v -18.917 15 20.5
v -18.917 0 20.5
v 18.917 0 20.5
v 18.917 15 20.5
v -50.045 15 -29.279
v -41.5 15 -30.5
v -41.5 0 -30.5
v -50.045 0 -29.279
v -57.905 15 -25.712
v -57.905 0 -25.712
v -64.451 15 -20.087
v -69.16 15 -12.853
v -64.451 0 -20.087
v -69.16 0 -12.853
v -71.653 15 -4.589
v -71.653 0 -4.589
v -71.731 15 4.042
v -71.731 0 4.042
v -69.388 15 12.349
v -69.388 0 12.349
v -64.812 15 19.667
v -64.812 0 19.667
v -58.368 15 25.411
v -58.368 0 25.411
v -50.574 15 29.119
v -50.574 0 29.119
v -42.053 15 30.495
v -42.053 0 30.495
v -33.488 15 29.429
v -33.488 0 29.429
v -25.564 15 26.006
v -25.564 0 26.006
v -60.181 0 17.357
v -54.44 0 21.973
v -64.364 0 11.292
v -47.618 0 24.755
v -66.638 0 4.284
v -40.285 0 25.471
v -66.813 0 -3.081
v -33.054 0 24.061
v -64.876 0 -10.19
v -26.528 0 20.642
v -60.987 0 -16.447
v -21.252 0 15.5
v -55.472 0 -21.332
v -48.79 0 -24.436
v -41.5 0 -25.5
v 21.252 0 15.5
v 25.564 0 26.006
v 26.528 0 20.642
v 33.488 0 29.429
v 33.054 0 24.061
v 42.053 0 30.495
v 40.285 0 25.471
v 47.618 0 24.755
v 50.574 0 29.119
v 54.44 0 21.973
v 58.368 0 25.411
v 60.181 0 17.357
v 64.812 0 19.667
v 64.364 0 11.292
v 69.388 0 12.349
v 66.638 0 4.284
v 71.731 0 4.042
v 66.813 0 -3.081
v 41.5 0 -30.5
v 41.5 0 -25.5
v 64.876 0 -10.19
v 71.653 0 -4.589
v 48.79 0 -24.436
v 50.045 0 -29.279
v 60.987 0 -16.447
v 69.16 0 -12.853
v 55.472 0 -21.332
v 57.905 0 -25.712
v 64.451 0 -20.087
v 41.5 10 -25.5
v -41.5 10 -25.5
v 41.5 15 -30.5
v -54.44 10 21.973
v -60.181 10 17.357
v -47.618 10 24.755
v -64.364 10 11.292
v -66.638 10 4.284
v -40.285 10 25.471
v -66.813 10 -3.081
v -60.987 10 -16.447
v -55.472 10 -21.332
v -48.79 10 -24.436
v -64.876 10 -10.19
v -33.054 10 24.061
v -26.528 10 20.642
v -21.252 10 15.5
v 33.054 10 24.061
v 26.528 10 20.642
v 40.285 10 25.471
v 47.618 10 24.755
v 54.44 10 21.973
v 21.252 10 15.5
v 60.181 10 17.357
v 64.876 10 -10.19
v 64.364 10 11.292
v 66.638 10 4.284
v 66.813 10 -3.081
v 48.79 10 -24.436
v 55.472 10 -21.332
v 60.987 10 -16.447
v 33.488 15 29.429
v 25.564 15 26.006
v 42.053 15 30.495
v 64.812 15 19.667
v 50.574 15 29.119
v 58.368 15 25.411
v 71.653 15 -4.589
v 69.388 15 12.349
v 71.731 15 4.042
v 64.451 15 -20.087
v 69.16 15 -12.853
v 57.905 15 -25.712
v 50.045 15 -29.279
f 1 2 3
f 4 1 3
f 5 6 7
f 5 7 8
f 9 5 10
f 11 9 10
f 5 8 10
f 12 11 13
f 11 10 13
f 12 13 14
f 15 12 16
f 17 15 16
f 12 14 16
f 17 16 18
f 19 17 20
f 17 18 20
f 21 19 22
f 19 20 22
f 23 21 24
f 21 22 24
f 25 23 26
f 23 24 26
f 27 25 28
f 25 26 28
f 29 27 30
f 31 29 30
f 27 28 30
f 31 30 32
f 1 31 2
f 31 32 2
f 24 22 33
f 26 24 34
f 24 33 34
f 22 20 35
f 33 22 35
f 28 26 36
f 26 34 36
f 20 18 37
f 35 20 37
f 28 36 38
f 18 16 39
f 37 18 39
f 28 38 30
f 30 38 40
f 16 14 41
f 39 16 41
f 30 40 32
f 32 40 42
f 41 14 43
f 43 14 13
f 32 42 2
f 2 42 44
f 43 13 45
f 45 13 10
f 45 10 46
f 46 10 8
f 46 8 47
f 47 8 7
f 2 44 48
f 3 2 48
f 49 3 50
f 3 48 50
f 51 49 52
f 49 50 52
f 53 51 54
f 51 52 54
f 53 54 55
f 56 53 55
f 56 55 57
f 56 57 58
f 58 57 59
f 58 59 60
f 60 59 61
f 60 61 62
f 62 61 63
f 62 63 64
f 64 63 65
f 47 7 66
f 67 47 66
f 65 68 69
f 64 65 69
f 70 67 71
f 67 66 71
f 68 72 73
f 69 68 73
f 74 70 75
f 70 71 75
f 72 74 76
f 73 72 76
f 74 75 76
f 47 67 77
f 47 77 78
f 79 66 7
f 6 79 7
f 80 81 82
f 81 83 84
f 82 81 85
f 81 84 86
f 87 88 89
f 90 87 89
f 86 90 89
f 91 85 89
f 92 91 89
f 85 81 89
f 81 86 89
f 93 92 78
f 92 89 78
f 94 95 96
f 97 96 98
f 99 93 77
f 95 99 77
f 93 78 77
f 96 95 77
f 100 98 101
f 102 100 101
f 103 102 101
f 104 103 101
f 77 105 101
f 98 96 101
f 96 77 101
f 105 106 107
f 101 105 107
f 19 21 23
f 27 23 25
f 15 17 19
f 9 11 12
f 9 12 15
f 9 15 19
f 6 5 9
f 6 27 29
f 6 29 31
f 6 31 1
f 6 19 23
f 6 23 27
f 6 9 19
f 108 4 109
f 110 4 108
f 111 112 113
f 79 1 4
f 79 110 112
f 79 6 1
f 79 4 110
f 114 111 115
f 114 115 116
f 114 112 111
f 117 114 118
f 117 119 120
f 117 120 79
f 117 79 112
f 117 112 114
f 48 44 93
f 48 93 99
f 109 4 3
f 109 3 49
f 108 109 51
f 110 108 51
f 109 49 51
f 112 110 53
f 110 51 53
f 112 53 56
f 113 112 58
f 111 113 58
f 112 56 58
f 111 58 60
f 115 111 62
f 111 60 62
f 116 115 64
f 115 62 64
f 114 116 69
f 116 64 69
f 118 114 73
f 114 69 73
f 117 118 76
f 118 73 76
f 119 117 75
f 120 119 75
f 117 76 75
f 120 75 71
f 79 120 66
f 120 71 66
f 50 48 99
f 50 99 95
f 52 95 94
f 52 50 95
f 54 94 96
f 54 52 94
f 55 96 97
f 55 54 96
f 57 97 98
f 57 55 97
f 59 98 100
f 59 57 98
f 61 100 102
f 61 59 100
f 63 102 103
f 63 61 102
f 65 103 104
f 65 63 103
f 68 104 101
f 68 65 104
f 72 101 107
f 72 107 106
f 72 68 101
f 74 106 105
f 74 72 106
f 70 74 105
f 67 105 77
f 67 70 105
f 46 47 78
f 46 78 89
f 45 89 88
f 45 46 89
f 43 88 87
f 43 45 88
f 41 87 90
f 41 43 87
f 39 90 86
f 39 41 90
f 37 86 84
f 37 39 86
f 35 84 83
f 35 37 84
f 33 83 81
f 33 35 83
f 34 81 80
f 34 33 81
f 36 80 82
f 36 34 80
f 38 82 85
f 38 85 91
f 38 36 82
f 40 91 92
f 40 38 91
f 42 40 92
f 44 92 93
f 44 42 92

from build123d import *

# Parameters (mm, degrees)
BOSS_EXTRUDE1_DEPTH = 15
CUT_EXTRUDE1_DEPTH  = 10


with BuildPart() as part:
    # Sketch1 → Boss-Extrude1 (new body)
    with BuildSketch(Plane(origin=(0, 0, 0), x_dir=(1, 0, 0), z_dir=(0, 1, 0))):
        with BuildLine():
            Line((41.5, 30.5), (-41.5, 30.5))
            ThreePointArc((-41.5, 30.5), (-69.388169535, -12.349089035), (-18.916820419, -20.5))
            Line((-18.916820419, -20.5), (18.916820419, -20.5))
            ThreePointArc((18.916820419, -20.5), (69.388169535, -12.349089035), (41.5, 30.5))
        make_face()
    extrude(amount=BOSS_EXTRUDE1_DEPTH)

    # Sketch2 → Cut-Extrude1 (cut)
    with BuildSketch(Plane(origin=(0, 0, 0), x_dir=(1, 0, 0), z_dir=(0, 1, 0))):
        with BuildLine():
            Line((41.5, 25.5), (-41.5, 25.5))
            ThreePointArc((-41.5, 25.5), (-64.36372673, -11.291589791), (-21.251543269, -15.5))
            Line((-21.251543269, -15.5), (21.251543269, -15.5))
            ThreePointArc((21.251543269, -15.5), (64.36372673, -11.291589791), (41.5, 25.5))
        make_face()
    extrude(amount=CUT_EXTRUDE1_DEPTH, mode=Mode.SUBTRACT)


solid = part.part
